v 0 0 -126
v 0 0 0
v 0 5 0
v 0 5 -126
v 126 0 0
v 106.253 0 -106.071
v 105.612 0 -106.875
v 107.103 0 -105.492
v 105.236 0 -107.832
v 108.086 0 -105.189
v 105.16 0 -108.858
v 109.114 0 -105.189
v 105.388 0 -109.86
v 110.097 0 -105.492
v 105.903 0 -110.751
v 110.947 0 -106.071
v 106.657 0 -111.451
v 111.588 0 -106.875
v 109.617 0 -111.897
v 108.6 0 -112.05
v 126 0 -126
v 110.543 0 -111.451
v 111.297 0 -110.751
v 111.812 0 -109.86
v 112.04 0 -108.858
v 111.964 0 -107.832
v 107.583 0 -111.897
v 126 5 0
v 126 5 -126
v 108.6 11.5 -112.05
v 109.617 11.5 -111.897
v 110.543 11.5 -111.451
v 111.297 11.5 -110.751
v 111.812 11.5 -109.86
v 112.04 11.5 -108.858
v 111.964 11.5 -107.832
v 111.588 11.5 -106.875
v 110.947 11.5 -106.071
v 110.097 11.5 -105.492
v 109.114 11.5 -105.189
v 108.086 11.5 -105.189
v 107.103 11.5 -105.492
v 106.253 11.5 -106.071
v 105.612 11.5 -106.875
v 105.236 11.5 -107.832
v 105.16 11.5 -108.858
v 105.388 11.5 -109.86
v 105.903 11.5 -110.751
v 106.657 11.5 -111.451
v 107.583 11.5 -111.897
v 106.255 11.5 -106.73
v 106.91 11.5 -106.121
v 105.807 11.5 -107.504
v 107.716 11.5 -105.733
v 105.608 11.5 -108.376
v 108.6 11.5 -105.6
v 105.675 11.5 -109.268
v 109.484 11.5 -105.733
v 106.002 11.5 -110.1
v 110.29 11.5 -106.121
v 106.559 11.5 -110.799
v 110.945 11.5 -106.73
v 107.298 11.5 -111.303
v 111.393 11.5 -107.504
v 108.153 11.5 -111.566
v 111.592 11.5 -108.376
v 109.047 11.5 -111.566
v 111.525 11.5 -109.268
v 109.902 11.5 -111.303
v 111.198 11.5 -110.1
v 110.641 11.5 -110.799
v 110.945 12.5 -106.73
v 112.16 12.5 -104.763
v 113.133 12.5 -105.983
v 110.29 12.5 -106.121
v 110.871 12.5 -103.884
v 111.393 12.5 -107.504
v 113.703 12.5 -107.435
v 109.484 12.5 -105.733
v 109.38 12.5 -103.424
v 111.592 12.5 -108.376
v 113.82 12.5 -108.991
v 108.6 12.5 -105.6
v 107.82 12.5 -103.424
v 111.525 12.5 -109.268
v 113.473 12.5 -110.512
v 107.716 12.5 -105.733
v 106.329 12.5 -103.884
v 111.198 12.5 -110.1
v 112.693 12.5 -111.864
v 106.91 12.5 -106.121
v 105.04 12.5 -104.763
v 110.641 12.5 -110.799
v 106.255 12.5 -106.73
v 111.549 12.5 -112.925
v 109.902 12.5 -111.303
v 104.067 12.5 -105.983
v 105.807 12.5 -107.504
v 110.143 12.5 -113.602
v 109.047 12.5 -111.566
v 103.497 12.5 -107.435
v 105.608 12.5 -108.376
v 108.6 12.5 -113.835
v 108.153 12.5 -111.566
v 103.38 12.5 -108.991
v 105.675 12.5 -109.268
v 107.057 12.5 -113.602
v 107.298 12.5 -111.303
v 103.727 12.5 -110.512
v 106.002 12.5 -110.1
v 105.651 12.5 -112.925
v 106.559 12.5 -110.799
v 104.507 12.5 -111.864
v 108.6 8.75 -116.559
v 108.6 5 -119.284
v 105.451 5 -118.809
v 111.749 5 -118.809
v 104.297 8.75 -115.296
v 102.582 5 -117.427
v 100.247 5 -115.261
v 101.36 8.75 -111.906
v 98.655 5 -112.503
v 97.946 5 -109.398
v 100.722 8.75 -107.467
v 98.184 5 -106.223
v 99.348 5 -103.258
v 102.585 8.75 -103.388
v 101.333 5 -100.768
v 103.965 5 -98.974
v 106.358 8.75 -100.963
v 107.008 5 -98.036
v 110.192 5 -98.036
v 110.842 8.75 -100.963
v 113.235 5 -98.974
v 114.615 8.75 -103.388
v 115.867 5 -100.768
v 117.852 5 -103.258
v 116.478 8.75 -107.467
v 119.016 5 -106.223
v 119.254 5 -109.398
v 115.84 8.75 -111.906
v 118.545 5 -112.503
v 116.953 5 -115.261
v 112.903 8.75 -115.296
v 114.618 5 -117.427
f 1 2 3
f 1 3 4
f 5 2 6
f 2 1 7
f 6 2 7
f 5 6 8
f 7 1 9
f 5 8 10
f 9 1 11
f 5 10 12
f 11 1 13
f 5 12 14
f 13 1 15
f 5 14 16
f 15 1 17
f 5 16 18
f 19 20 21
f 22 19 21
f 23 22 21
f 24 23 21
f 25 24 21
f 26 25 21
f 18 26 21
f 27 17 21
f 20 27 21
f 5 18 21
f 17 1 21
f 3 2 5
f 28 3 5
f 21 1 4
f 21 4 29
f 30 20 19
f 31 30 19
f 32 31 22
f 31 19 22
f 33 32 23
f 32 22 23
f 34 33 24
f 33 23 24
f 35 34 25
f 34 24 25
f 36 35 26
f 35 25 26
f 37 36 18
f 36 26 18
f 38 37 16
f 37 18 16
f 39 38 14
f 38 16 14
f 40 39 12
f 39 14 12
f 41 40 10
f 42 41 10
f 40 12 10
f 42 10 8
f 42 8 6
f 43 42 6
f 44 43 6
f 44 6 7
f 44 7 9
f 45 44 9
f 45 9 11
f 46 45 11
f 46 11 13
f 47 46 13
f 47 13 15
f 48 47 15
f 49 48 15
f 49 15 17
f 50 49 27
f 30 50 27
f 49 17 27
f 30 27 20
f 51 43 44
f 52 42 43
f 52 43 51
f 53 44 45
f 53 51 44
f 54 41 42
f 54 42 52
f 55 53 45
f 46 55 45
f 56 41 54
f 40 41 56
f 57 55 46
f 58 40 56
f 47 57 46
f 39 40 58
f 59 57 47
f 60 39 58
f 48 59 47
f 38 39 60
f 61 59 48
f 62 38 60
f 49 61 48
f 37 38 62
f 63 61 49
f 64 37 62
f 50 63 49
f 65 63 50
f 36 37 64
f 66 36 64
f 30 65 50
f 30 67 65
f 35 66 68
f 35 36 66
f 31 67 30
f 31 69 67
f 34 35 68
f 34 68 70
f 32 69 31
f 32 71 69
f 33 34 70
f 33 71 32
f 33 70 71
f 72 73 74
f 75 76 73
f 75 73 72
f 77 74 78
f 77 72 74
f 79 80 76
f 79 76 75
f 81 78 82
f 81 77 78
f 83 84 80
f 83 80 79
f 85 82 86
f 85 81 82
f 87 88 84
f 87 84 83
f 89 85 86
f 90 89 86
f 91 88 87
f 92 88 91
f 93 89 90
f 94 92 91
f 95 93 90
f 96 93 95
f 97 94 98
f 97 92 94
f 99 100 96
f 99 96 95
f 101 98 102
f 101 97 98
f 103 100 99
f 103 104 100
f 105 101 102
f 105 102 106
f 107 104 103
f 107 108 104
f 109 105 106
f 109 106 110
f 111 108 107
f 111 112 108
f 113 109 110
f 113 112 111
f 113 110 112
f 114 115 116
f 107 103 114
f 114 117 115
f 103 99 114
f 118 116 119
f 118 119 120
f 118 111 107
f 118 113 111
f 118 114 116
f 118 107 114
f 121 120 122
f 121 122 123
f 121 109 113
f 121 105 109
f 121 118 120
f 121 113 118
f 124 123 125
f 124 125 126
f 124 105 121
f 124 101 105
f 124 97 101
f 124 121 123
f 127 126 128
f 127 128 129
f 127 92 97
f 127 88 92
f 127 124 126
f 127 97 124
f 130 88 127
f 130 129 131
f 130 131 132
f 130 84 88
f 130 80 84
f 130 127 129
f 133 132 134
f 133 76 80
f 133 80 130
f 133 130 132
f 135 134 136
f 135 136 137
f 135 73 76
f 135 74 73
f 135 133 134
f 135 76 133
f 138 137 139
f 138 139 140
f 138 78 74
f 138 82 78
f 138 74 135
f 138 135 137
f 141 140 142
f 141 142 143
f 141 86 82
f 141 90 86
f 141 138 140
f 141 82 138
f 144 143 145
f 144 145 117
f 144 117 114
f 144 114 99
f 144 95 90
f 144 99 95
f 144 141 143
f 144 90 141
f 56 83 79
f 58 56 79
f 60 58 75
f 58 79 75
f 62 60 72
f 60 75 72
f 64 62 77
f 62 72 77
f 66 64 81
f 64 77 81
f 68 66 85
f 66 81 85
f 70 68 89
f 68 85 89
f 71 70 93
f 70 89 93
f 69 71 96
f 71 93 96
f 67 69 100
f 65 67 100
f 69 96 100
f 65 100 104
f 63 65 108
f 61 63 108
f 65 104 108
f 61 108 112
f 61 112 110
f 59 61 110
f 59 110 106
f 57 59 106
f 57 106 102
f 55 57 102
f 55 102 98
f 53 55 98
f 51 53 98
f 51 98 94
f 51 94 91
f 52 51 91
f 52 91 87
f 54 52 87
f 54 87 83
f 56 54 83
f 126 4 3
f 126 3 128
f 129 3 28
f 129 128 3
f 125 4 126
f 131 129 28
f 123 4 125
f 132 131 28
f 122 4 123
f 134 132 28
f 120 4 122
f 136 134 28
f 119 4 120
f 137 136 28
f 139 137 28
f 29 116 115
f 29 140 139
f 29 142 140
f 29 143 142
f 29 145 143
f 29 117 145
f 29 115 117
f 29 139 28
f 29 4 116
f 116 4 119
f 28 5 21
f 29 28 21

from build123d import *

# Parameters (mm, degrees)
SKETCH1_W           = 126
SKETCH1_H           = 126
BOSS_EXTRUDE1_DEPTH = 5
SKETCH3_R           = 12.5
BOSS_EXTRUDE2_DEPTH = 7.5
SKETCH4_R           = 3.45
CUT_EXTRUDE1_DEPTH  = 11.5
SKETCH6_R           = 3
CUT_EXTRUDE2_DEPTH  = 179.628805068
CHAMFER1_SIZE       = 10
CHAMFER1_SIZE_2     = 7.26542528


with BuildPart() as part:
    # Sketch1 → Boss-Extrude1 (new body)
    with BuildSketch(Plane(origin=(0, 0, 0), x_dir=(1, 0, 0), z_dir=(0, 1, 0))):
        with Locations((63, 63)):
            Rectangle(SKETCH1_W, SKETCH1_H)
    extrude(amount=BOSS_EXTRUDE1_DEPTH)

    # Sketch3 → Boss-Extrude2 (add)
    with BuildSketch(Plane(origin=(0, 5, 0), x_dir=(1, 0, 0), z_dir=(0, 1, 0))):
        with Locations(Location((108.6, 108.6, 0), (0, 0, 90))):
            Circle(SKETCH3_R)
    extrude(amount=BOSS_EXTRUDE2_DEPTH)

    # Sketch4 → Cut-Extrude1 (cut)
    with BuildSketch(Plane.XZ):
        with Locations(Location((108.6, -108.6, 0), (0, 0, 270))):
            Circle(SKETCH4_R)
    extrude(amount=-CUT_EXTRUDE1_DEPTH, mode=Mode.SUBTRACT)

    # Sketch6 → Cut-Extrude2 (cut, through all)
    with BuildSketch(Plane(origin=(0, 12.5, 0), x_dir=(1, 0, 0), z_dir=(0, 1, 0))):
        with Locations(Location((108.6, 108.6, 0), (0, 0, 270))):
            Circle(SKETCH6_R)
    extrude(amount=-CUT_EXTRUDE2_DEPTH, mode=Mode.SUBTRACT)

    # Chamfer1
    # the kernel refuses this chamfer: 10, 7.26542528 mm, written as the material it takes off along each edge
    with BuildSketch(Plane(origin=(108.6, 12.5, -108.6), x_dir=(0, 0, -1), z_dir=(1, 0, 0))) as chamfer1_piece_1_section:
        Polygon((12.5, -CHAMFER1_SIZE), (12.5 - CHAMFER1_SIZE_2, 0), (12.5, 0), align=None)
    chamfer1_piece_1 = revolve(axis=Axis((108.6, 12.5, -108.6), (0, 1, 0)), mode=Mode.PRIVATE)
    chamfer1_piece_1 = split(chamfer1_piece_1, bisect_by=Plane(origin=(108.6, 5, -100.650989912), z_dir=(0, 1, 0)), keep=Keep.TOP, mode=Mode.PRIVATE)
    add(chamfer1_piece_1, mode=Mode.SUBTRACT)


solid = part.part
